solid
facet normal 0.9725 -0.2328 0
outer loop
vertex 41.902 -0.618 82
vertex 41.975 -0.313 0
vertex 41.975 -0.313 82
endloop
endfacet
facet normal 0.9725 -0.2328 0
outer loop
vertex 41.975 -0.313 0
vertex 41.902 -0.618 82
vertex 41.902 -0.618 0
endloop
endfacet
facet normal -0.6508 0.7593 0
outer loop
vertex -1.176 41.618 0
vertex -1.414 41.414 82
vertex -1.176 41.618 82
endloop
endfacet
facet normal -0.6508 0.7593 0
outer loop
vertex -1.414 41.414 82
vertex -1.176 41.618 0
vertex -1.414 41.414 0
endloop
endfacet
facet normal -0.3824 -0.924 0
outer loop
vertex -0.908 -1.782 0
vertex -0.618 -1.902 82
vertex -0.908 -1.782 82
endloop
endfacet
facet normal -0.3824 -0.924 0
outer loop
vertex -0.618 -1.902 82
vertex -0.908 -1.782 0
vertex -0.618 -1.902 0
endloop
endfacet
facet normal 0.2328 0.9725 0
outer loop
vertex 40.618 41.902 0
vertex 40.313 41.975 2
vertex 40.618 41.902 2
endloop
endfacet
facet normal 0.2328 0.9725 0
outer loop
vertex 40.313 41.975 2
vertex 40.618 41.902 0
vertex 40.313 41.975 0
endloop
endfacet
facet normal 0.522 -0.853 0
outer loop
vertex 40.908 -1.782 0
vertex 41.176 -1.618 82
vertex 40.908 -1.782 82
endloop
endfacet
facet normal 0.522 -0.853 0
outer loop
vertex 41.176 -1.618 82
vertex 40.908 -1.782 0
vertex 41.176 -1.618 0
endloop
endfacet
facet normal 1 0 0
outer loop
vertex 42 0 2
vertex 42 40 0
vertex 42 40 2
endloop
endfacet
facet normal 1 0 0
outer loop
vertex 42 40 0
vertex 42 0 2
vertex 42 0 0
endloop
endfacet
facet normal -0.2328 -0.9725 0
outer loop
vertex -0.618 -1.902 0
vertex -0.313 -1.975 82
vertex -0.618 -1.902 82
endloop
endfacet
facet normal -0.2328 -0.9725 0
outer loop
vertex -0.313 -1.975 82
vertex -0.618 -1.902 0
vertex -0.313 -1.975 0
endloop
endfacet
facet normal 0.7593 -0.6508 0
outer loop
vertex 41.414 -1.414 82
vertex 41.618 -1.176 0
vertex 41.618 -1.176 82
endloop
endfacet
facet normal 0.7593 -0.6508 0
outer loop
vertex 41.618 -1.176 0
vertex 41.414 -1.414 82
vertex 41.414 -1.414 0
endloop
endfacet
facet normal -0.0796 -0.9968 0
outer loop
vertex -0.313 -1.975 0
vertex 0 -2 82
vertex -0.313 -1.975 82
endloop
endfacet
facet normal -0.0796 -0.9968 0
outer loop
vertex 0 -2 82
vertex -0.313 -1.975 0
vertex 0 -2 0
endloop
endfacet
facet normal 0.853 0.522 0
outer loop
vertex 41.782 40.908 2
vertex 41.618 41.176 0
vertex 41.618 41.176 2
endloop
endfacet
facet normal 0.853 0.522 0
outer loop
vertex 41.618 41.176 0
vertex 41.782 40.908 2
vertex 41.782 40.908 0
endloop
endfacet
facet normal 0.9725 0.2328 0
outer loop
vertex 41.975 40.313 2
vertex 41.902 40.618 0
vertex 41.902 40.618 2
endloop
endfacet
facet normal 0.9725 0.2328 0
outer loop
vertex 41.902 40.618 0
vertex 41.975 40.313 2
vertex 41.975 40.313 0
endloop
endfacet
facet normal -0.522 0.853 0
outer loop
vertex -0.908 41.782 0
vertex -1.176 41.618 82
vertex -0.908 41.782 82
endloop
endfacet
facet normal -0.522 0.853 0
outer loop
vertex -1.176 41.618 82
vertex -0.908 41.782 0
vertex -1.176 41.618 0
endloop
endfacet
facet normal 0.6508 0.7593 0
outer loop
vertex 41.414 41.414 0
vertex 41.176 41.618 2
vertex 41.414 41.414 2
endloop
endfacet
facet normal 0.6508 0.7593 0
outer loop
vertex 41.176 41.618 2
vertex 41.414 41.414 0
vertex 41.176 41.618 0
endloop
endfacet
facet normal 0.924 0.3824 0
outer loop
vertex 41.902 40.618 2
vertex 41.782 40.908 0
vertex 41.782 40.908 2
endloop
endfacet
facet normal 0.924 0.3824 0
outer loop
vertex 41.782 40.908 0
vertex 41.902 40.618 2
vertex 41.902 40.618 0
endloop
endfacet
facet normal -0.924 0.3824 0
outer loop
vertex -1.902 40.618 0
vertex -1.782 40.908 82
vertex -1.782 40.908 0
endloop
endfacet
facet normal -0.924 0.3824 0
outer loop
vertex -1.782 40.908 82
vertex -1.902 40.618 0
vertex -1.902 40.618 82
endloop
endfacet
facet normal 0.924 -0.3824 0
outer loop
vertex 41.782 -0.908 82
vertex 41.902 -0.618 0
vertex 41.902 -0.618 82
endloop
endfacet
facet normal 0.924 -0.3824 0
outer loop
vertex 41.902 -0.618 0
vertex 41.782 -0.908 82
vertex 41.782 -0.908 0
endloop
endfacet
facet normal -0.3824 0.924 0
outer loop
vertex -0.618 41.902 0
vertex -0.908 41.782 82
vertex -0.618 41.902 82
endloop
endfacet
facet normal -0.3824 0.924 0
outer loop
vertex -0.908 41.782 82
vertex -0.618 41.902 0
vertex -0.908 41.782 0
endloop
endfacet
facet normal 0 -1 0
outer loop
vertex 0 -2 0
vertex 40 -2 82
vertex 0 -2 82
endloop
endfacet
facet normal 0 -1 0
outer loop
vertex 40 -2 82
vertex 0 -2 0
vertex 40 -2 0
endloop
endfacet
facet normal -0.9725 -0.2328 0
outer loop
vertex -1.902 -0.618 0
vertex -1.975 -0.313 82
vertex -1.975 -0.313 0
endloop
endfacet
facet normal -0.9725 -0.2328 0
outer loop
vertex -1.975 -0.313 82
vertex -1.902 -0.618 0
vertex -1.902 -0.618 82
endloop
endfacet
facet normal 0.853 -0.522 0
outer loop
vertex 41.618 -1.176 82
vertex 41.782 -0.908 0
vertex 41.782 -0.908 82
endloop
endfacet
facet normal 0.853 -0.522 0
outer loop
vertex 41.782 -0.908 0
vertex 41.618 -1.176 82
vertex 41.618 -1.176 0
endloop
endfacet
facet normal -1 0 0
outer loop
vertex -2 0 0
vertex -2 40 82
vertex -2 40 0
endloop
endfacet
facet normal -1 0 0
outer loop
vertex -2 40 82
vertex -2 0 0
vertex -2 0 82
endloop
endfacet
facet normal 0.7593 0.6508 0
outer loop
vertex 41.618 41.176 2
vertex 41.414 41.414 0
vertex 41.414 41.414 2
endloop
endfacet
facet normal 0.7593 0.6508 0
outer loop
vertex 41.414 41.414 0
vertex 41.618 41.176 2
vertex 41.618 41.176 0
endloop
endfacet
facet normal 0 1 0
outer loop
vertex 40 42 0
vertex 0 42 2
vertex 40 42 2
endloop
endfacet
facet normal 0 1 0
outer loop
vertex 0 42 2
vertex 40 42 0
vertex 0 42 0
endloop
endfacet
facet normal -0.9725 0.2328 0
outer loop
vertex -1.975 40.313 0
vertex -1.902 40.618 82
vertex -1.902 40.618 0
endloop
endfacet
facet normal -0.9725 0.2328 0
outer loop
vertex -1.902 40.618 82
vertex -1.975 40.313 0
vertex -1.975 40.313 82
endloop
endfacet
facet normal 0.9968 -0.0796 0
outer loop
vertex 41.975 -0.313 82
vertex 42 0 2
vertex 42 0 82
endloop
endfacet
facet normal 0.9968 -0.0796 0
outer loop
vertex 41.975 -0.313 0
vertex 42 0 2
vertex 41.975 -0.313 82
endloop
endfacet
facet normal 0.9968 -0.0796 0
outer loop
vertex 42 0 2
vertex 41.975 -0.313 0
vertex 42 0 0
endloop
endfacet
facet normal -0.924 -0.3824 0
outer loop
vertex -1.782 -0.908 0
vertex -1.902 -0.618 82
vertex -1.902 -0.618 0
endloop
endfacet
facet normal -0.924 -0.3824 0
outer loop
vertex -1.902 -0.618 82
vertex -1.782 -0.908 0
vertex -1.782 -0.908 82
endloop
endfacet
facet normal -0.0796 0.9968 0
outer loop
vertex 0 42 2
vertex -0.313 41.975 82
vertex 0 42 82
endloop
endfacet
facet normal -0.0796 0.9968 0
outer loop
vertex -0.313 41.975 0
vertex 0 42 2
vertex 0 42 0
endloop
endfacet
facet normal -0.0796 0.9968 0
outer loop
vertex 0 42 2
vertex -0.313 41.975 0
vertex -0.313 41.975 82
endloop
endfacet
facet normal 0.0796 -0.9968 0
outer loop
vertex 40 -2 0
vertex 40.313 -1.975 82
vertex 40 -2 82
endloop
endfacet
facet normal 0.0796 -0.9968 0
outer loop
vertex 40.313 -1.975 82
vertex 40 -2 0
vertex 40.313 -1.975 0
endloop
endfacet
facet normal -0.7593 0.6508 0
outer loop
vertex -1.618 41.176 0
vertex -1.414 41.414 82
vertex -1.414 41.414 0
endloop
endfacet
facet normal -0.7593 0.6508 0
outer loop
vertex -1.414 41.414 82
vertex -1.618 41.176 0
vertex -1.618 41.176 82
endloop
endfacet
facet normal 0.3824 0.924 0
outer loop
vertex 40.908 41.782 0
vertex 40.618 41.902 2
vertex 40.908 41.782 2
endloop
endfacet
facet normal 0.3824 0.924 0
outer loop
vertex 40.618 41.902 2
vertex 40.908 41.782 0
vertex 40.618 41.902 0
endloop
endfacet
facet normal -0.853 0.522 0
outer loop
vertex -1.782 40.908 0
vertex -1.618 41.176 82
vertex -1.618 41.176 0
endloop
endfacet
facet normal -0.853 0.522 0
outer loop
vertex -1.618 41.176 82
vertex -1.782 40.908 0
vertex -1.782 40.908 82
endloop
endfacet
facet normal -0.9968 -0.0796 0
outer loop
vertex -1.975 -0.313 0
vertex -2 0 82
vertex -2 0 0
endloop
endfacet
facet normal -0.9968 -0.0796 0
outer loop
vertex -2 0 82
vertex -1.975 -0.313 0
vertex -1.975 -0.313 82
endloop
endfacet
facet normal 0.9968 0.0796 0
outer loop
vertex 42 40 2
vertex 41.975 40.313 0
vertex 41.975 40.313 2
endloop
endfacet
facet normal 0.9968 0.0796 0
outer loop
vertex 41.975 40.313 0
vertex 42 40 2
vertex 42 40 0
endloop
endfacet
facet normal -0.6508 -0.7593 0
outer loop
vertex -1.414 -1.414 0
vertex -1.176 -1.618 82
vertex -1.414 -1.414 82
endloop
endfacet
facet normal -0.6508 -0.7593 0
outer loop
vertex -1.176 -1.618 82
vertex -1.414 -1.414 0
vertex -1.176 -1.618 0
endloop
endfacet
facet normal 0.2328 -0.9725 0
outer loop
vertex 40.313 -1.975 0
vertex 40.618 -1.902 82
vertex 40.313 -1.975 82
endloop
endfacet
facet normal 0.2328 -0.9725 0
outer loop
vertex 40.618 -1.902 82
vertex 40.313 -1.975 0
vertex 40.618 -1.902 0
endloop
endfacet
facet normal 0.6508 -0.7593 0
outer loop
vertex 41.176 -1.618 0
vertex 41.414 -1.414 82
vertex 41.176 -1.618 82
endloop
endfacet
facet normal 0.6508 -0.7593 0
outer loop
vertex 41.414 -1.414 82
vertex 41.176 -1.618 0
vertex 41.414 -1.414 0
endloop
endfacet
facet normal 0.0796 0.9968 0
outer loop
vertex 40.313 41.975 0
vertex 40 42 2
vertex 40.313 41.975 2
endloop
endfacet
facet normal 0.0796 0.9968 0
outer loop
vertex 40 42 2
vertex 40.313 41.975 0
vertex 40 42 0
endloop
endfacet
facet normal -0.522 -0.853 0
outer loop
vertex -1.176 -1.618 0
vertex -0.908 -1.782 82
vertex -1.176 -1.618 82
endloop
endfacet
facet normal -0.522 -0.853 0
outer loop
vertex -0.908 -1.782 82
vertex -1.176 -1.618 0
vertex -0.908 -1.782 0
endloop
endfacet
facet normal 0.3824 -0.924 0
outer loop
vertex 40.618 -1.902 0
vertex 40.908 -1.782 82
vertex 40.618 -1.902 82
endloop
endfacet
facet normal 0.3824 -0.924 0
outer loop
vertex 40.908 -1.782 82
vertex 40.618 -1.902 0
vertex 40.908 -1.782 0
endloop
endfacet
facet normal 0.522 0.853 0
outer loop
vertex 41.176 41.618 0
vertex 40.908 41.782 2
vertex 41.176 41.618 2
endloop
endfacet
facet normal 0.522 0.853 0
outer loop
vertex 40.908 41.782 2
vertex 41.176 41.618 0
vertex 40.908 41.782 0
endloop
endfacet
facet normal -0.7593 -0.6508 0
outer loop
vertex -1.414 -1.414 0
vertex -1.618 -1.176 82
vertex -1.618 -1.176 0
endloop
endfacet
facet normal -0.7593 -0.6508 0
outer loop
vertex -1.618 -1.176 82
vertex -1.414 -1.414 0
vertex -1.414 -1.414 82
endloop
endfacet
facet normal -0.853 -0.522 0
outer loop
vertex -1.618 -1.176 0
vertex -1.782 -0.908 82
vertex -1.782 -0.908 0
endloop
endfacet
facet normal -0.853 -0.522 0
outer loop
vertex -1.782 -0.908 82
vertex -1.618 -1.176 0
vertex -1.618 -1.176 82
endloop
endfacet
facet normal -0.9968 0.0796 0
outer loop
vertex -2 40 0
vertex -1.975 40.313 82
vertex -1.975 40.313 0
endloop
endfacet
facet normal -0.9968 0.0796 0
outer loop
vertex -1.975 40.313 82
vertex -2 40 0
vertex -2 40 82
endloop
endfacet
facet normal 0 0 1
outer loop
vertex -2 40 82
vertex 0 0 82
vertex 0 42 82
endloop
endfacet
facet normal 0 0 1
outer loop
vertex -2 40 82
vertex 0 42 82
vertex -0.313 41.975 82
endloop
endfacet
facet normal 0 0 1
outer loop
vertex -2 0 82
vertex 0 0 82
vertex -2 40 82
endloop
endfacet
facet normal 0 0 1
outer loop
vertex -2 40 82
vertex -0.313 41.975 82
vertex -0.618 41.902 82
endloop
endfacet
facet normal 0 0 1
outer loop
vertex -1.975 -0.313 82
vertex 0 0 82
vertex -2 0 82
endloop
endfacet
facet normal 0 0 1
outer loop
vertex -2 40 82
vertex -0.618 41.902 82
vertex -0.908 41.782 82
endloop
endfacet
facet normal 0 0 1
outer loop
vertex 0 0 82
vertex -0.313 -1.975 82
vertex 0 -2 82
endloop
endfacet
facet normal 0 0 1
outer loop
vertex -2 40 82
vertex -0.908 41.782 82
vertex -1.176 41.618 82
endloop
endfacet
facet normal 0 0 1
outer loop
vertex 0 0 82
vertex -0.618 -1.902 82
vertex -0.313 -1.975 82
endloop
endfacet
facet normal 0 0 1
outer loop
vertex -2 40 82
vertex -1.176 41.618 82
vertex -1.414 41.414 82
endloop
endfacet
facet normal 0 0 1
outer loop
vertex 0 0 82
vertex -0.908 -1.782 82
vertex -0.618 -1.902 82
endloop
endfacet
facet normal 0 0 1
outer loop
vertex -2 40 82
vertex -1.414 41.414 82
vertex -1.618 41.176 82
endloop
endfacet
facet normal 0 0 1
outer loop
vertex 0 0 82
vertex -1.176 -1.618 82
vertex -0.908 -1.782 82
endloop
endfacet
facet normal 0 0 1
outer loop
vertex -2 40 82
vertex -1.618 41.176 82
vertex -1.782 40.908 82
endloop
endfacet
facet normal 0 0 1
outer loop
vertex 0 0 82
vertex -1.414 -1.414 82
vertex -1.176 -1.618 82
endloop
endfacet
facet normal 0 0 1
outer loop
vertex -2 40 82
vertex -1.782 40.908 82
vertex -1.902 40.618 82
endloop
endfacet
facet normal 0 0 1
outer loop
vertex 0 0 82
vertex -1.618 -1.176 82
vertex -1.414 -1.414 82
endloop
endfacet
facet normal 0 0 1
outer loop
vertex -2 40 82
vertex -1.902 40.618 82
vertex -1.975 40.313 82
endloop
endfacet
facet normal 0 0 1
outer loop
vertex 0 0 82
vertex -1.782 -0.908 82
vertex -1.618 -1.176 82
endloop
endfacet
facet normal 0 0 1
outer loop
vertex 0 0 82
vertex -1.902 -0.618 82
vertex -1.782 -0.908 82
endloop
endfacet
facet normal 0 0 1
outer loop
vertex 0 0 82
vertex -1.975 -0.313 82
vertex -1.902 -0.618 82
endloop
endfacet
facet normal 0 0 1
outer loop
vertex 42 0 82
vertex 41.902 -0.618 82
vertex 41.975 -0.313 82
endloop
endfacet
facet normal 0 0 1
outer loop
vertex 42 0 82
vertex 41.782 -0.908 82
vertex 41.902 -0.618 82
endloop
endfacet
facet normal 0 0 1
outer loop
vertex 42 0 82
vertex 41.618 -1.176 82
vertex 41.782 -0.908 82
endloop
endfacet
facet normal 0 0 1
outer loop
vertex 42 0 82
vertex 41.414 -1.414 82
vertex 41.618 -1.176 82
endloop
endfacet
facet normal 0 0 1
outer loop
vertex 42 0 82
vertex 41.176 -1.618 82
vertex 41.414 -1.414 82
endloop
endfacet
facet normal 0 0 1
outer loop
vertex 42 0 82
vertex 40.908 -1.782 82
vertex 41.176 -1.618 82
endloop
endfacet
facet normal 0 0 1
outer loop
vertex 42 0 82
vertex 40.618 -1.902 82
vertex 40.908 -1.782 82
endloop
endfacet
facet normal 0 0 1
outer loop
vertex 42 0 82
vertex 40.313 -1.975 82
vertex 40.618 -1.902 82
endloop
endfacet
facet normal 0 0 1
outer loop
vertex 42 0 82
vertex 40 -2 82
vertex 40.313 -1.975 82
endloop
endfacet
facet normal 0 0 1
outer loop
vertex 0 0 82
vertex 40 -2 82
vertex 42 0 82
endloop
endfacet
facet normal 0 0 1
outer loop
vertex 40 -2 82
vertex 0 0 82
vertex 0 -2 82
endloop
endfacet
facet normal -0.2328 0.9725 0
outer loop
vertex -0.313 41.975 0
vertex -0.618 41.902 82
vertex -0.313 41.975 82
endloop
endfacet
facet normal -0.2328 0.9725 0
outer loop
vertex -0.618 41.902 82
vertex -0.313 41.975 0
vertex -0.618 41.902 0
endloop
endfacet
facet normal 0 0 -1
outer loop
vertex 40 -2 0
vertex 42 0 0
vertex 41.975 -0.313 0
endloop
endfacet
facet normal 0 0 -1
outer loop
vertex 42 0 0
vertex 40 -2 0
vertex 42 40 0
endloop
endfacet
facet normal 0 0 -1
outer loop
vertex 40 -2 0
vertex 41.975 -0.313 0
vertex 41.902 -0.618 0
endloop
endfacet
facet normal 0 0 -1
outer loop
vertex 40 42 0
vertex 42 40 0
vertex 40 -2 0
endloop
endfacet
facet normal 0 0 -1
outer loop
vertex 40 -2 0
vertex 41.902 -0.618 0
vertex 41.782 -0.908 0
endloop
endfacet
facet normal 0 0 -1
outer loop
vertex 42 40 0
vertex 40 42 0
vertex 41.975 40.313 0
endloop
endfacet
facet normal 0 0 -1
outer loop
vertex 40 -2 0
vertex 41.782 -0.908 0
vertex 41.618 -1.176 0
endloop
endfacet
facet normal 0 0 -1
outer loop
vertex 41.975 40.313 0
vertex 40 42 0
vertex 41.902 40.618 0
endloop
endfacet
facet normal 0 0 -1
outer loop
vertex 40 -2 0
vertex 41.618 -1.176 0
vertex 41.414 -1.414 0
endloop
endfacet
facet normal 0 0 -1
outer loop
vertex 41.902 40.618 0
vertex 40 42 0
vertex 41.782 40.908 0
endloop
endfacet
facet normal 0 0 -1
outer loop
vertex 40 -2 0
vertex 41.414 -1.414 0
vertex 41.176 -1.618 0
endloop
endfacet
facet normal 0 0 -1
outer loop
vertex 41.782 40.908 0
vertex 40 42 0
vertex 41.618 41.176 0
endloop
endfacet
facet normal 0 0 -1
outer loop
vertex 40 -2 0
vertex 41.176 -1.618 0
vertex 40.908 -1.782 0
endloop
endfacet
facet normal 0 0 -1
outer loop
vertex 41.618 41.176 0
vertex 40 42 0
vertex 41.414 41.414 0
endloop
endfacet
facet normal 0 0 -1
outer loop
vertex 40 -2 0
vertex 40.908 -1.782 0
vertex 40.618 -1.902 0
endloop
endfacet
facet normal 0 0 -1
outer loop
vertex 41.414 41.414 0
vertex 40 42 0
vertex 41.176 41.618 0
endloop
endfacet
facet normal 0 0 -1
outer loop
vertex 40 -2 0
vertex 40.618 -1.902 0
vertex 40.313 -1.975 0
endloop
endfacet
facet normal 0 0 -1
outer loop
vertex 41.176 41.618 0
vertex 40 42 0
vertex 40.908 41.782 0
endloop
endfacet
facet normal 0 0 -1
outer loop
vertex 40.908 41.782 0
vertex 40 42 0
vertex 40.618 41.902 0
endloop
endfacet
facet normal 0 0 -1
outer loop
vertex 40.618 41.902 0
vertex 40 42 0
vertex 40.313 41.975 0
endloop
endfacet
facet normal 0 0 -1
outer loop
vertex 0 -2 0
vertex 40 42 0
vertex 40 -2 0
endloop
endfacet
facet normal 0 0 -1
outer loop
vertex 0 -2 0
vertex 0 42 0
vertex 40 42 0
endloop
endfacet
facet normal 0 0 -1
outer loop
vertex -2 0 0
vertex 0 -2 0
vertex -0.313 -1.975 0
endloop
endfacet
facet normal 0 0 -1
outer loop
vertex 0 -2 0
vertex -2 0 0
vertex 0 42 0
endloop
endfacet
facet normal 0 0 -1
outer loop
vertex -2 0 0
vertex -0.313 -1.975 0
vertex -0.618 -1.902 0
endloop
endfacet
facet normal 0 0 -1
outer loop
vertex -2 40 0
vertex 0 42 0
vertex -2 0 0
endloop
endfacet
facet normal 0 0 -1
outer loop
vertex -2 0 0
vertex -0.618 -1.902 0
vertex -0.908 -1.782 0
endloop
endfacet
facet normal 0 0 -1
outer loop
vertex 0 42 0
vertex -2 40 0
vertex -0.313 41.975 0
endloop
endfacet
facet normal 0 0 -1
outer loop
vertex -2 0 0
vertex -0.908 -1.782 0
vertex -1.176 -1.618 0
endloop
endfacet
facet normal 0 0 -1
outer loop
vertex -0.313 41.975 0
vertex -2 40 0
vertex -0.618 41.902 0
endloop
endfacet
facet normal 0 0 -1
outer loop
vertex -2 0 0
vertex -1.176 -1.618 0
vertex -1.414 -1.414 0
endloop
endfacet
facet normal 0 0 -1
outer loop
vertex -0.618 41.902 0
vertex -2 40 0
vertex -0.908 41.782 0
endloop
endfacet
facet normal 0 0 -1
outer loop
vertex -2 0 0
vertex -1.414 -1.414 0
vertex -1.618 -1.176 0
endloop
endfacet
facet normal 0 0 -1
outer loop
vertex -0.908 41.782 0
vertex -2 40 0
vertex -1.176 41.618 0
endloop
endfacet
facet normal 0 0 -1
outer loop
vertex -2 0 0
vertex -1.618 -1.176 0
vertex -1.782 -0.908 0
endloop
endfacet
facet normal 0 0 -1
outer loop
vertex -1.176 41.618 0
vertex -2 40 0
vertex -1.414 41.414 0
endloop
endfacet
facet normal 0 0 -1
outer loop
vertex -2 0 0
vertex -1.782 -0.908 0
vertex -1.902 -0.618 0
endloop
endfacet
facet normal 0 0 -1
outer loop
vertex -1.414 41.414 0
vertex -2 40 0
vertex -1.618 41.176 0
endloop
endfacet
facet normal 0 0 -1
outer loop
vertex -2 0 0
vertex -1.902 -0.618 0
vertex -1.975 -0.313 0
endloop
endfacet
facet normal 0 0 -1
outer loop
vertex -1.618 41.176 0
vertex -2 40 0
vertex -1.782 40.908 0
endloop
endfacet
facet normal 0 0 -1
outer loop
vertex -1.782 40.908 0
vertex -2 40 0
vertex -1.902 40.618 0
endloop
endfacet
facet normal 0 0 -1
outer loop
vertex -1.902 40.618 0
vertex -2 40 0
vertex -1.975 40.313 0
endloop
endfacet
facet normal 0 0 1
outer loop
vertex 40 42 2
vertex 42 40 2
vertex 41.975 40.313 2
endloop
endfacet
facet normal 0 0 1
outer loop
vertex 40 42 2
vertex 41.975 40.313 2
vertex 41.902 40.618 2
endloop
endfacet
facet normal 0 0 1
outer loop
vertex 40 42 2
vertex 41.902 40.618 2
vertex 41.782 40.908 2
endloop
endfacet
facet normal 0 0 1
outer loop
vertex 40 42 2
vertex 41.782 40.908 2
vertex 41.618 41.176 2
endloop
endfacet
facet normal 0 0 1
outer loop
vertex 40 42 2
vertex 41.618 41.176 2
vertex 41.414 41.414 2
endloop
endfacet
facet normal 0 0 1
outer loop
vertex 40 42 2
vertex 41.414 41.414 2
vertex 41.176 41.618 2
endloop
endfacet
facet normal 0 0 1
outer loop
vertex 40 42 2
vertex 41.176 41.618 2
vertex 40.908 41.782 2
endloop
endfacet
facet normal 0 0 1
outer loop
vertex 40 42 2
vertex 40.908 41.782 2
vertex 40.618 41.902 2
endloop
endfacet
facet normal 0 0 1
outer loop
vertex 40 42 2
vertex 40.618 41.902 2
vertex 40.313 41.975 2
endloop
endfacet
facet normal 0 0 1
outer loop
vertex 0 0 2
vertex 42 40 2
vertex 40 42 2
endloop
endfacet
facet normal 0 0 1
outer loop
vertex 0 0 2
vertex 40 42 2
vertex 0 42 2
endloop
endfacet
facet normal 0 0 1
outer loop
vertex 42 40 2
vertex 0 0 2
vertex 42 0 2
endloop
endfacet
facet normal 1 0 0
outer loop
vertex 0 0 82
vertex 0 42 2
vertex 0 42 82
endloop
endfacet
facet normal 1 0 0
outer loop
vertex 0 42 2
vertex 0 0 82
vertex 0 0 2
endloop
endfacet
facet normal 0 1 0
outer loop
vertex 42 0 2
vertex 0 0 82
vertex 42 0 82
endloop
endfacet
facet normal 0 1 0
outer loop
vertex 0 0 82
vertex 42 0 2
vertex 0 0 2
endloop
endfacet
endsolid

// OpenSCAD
$fn=40;

difference() {
   hull() {
      cylinder(r=2,h=82);
      translate([40,0,0]) cylinder(r=2,h=82);
      translate([40,40,0]) cylinder(r=2,h=82);
      translate([0,40,0]) cylinder(r=2,h=82);
   }
   translate([0,0,2]) cube([50,50,90]);
}
